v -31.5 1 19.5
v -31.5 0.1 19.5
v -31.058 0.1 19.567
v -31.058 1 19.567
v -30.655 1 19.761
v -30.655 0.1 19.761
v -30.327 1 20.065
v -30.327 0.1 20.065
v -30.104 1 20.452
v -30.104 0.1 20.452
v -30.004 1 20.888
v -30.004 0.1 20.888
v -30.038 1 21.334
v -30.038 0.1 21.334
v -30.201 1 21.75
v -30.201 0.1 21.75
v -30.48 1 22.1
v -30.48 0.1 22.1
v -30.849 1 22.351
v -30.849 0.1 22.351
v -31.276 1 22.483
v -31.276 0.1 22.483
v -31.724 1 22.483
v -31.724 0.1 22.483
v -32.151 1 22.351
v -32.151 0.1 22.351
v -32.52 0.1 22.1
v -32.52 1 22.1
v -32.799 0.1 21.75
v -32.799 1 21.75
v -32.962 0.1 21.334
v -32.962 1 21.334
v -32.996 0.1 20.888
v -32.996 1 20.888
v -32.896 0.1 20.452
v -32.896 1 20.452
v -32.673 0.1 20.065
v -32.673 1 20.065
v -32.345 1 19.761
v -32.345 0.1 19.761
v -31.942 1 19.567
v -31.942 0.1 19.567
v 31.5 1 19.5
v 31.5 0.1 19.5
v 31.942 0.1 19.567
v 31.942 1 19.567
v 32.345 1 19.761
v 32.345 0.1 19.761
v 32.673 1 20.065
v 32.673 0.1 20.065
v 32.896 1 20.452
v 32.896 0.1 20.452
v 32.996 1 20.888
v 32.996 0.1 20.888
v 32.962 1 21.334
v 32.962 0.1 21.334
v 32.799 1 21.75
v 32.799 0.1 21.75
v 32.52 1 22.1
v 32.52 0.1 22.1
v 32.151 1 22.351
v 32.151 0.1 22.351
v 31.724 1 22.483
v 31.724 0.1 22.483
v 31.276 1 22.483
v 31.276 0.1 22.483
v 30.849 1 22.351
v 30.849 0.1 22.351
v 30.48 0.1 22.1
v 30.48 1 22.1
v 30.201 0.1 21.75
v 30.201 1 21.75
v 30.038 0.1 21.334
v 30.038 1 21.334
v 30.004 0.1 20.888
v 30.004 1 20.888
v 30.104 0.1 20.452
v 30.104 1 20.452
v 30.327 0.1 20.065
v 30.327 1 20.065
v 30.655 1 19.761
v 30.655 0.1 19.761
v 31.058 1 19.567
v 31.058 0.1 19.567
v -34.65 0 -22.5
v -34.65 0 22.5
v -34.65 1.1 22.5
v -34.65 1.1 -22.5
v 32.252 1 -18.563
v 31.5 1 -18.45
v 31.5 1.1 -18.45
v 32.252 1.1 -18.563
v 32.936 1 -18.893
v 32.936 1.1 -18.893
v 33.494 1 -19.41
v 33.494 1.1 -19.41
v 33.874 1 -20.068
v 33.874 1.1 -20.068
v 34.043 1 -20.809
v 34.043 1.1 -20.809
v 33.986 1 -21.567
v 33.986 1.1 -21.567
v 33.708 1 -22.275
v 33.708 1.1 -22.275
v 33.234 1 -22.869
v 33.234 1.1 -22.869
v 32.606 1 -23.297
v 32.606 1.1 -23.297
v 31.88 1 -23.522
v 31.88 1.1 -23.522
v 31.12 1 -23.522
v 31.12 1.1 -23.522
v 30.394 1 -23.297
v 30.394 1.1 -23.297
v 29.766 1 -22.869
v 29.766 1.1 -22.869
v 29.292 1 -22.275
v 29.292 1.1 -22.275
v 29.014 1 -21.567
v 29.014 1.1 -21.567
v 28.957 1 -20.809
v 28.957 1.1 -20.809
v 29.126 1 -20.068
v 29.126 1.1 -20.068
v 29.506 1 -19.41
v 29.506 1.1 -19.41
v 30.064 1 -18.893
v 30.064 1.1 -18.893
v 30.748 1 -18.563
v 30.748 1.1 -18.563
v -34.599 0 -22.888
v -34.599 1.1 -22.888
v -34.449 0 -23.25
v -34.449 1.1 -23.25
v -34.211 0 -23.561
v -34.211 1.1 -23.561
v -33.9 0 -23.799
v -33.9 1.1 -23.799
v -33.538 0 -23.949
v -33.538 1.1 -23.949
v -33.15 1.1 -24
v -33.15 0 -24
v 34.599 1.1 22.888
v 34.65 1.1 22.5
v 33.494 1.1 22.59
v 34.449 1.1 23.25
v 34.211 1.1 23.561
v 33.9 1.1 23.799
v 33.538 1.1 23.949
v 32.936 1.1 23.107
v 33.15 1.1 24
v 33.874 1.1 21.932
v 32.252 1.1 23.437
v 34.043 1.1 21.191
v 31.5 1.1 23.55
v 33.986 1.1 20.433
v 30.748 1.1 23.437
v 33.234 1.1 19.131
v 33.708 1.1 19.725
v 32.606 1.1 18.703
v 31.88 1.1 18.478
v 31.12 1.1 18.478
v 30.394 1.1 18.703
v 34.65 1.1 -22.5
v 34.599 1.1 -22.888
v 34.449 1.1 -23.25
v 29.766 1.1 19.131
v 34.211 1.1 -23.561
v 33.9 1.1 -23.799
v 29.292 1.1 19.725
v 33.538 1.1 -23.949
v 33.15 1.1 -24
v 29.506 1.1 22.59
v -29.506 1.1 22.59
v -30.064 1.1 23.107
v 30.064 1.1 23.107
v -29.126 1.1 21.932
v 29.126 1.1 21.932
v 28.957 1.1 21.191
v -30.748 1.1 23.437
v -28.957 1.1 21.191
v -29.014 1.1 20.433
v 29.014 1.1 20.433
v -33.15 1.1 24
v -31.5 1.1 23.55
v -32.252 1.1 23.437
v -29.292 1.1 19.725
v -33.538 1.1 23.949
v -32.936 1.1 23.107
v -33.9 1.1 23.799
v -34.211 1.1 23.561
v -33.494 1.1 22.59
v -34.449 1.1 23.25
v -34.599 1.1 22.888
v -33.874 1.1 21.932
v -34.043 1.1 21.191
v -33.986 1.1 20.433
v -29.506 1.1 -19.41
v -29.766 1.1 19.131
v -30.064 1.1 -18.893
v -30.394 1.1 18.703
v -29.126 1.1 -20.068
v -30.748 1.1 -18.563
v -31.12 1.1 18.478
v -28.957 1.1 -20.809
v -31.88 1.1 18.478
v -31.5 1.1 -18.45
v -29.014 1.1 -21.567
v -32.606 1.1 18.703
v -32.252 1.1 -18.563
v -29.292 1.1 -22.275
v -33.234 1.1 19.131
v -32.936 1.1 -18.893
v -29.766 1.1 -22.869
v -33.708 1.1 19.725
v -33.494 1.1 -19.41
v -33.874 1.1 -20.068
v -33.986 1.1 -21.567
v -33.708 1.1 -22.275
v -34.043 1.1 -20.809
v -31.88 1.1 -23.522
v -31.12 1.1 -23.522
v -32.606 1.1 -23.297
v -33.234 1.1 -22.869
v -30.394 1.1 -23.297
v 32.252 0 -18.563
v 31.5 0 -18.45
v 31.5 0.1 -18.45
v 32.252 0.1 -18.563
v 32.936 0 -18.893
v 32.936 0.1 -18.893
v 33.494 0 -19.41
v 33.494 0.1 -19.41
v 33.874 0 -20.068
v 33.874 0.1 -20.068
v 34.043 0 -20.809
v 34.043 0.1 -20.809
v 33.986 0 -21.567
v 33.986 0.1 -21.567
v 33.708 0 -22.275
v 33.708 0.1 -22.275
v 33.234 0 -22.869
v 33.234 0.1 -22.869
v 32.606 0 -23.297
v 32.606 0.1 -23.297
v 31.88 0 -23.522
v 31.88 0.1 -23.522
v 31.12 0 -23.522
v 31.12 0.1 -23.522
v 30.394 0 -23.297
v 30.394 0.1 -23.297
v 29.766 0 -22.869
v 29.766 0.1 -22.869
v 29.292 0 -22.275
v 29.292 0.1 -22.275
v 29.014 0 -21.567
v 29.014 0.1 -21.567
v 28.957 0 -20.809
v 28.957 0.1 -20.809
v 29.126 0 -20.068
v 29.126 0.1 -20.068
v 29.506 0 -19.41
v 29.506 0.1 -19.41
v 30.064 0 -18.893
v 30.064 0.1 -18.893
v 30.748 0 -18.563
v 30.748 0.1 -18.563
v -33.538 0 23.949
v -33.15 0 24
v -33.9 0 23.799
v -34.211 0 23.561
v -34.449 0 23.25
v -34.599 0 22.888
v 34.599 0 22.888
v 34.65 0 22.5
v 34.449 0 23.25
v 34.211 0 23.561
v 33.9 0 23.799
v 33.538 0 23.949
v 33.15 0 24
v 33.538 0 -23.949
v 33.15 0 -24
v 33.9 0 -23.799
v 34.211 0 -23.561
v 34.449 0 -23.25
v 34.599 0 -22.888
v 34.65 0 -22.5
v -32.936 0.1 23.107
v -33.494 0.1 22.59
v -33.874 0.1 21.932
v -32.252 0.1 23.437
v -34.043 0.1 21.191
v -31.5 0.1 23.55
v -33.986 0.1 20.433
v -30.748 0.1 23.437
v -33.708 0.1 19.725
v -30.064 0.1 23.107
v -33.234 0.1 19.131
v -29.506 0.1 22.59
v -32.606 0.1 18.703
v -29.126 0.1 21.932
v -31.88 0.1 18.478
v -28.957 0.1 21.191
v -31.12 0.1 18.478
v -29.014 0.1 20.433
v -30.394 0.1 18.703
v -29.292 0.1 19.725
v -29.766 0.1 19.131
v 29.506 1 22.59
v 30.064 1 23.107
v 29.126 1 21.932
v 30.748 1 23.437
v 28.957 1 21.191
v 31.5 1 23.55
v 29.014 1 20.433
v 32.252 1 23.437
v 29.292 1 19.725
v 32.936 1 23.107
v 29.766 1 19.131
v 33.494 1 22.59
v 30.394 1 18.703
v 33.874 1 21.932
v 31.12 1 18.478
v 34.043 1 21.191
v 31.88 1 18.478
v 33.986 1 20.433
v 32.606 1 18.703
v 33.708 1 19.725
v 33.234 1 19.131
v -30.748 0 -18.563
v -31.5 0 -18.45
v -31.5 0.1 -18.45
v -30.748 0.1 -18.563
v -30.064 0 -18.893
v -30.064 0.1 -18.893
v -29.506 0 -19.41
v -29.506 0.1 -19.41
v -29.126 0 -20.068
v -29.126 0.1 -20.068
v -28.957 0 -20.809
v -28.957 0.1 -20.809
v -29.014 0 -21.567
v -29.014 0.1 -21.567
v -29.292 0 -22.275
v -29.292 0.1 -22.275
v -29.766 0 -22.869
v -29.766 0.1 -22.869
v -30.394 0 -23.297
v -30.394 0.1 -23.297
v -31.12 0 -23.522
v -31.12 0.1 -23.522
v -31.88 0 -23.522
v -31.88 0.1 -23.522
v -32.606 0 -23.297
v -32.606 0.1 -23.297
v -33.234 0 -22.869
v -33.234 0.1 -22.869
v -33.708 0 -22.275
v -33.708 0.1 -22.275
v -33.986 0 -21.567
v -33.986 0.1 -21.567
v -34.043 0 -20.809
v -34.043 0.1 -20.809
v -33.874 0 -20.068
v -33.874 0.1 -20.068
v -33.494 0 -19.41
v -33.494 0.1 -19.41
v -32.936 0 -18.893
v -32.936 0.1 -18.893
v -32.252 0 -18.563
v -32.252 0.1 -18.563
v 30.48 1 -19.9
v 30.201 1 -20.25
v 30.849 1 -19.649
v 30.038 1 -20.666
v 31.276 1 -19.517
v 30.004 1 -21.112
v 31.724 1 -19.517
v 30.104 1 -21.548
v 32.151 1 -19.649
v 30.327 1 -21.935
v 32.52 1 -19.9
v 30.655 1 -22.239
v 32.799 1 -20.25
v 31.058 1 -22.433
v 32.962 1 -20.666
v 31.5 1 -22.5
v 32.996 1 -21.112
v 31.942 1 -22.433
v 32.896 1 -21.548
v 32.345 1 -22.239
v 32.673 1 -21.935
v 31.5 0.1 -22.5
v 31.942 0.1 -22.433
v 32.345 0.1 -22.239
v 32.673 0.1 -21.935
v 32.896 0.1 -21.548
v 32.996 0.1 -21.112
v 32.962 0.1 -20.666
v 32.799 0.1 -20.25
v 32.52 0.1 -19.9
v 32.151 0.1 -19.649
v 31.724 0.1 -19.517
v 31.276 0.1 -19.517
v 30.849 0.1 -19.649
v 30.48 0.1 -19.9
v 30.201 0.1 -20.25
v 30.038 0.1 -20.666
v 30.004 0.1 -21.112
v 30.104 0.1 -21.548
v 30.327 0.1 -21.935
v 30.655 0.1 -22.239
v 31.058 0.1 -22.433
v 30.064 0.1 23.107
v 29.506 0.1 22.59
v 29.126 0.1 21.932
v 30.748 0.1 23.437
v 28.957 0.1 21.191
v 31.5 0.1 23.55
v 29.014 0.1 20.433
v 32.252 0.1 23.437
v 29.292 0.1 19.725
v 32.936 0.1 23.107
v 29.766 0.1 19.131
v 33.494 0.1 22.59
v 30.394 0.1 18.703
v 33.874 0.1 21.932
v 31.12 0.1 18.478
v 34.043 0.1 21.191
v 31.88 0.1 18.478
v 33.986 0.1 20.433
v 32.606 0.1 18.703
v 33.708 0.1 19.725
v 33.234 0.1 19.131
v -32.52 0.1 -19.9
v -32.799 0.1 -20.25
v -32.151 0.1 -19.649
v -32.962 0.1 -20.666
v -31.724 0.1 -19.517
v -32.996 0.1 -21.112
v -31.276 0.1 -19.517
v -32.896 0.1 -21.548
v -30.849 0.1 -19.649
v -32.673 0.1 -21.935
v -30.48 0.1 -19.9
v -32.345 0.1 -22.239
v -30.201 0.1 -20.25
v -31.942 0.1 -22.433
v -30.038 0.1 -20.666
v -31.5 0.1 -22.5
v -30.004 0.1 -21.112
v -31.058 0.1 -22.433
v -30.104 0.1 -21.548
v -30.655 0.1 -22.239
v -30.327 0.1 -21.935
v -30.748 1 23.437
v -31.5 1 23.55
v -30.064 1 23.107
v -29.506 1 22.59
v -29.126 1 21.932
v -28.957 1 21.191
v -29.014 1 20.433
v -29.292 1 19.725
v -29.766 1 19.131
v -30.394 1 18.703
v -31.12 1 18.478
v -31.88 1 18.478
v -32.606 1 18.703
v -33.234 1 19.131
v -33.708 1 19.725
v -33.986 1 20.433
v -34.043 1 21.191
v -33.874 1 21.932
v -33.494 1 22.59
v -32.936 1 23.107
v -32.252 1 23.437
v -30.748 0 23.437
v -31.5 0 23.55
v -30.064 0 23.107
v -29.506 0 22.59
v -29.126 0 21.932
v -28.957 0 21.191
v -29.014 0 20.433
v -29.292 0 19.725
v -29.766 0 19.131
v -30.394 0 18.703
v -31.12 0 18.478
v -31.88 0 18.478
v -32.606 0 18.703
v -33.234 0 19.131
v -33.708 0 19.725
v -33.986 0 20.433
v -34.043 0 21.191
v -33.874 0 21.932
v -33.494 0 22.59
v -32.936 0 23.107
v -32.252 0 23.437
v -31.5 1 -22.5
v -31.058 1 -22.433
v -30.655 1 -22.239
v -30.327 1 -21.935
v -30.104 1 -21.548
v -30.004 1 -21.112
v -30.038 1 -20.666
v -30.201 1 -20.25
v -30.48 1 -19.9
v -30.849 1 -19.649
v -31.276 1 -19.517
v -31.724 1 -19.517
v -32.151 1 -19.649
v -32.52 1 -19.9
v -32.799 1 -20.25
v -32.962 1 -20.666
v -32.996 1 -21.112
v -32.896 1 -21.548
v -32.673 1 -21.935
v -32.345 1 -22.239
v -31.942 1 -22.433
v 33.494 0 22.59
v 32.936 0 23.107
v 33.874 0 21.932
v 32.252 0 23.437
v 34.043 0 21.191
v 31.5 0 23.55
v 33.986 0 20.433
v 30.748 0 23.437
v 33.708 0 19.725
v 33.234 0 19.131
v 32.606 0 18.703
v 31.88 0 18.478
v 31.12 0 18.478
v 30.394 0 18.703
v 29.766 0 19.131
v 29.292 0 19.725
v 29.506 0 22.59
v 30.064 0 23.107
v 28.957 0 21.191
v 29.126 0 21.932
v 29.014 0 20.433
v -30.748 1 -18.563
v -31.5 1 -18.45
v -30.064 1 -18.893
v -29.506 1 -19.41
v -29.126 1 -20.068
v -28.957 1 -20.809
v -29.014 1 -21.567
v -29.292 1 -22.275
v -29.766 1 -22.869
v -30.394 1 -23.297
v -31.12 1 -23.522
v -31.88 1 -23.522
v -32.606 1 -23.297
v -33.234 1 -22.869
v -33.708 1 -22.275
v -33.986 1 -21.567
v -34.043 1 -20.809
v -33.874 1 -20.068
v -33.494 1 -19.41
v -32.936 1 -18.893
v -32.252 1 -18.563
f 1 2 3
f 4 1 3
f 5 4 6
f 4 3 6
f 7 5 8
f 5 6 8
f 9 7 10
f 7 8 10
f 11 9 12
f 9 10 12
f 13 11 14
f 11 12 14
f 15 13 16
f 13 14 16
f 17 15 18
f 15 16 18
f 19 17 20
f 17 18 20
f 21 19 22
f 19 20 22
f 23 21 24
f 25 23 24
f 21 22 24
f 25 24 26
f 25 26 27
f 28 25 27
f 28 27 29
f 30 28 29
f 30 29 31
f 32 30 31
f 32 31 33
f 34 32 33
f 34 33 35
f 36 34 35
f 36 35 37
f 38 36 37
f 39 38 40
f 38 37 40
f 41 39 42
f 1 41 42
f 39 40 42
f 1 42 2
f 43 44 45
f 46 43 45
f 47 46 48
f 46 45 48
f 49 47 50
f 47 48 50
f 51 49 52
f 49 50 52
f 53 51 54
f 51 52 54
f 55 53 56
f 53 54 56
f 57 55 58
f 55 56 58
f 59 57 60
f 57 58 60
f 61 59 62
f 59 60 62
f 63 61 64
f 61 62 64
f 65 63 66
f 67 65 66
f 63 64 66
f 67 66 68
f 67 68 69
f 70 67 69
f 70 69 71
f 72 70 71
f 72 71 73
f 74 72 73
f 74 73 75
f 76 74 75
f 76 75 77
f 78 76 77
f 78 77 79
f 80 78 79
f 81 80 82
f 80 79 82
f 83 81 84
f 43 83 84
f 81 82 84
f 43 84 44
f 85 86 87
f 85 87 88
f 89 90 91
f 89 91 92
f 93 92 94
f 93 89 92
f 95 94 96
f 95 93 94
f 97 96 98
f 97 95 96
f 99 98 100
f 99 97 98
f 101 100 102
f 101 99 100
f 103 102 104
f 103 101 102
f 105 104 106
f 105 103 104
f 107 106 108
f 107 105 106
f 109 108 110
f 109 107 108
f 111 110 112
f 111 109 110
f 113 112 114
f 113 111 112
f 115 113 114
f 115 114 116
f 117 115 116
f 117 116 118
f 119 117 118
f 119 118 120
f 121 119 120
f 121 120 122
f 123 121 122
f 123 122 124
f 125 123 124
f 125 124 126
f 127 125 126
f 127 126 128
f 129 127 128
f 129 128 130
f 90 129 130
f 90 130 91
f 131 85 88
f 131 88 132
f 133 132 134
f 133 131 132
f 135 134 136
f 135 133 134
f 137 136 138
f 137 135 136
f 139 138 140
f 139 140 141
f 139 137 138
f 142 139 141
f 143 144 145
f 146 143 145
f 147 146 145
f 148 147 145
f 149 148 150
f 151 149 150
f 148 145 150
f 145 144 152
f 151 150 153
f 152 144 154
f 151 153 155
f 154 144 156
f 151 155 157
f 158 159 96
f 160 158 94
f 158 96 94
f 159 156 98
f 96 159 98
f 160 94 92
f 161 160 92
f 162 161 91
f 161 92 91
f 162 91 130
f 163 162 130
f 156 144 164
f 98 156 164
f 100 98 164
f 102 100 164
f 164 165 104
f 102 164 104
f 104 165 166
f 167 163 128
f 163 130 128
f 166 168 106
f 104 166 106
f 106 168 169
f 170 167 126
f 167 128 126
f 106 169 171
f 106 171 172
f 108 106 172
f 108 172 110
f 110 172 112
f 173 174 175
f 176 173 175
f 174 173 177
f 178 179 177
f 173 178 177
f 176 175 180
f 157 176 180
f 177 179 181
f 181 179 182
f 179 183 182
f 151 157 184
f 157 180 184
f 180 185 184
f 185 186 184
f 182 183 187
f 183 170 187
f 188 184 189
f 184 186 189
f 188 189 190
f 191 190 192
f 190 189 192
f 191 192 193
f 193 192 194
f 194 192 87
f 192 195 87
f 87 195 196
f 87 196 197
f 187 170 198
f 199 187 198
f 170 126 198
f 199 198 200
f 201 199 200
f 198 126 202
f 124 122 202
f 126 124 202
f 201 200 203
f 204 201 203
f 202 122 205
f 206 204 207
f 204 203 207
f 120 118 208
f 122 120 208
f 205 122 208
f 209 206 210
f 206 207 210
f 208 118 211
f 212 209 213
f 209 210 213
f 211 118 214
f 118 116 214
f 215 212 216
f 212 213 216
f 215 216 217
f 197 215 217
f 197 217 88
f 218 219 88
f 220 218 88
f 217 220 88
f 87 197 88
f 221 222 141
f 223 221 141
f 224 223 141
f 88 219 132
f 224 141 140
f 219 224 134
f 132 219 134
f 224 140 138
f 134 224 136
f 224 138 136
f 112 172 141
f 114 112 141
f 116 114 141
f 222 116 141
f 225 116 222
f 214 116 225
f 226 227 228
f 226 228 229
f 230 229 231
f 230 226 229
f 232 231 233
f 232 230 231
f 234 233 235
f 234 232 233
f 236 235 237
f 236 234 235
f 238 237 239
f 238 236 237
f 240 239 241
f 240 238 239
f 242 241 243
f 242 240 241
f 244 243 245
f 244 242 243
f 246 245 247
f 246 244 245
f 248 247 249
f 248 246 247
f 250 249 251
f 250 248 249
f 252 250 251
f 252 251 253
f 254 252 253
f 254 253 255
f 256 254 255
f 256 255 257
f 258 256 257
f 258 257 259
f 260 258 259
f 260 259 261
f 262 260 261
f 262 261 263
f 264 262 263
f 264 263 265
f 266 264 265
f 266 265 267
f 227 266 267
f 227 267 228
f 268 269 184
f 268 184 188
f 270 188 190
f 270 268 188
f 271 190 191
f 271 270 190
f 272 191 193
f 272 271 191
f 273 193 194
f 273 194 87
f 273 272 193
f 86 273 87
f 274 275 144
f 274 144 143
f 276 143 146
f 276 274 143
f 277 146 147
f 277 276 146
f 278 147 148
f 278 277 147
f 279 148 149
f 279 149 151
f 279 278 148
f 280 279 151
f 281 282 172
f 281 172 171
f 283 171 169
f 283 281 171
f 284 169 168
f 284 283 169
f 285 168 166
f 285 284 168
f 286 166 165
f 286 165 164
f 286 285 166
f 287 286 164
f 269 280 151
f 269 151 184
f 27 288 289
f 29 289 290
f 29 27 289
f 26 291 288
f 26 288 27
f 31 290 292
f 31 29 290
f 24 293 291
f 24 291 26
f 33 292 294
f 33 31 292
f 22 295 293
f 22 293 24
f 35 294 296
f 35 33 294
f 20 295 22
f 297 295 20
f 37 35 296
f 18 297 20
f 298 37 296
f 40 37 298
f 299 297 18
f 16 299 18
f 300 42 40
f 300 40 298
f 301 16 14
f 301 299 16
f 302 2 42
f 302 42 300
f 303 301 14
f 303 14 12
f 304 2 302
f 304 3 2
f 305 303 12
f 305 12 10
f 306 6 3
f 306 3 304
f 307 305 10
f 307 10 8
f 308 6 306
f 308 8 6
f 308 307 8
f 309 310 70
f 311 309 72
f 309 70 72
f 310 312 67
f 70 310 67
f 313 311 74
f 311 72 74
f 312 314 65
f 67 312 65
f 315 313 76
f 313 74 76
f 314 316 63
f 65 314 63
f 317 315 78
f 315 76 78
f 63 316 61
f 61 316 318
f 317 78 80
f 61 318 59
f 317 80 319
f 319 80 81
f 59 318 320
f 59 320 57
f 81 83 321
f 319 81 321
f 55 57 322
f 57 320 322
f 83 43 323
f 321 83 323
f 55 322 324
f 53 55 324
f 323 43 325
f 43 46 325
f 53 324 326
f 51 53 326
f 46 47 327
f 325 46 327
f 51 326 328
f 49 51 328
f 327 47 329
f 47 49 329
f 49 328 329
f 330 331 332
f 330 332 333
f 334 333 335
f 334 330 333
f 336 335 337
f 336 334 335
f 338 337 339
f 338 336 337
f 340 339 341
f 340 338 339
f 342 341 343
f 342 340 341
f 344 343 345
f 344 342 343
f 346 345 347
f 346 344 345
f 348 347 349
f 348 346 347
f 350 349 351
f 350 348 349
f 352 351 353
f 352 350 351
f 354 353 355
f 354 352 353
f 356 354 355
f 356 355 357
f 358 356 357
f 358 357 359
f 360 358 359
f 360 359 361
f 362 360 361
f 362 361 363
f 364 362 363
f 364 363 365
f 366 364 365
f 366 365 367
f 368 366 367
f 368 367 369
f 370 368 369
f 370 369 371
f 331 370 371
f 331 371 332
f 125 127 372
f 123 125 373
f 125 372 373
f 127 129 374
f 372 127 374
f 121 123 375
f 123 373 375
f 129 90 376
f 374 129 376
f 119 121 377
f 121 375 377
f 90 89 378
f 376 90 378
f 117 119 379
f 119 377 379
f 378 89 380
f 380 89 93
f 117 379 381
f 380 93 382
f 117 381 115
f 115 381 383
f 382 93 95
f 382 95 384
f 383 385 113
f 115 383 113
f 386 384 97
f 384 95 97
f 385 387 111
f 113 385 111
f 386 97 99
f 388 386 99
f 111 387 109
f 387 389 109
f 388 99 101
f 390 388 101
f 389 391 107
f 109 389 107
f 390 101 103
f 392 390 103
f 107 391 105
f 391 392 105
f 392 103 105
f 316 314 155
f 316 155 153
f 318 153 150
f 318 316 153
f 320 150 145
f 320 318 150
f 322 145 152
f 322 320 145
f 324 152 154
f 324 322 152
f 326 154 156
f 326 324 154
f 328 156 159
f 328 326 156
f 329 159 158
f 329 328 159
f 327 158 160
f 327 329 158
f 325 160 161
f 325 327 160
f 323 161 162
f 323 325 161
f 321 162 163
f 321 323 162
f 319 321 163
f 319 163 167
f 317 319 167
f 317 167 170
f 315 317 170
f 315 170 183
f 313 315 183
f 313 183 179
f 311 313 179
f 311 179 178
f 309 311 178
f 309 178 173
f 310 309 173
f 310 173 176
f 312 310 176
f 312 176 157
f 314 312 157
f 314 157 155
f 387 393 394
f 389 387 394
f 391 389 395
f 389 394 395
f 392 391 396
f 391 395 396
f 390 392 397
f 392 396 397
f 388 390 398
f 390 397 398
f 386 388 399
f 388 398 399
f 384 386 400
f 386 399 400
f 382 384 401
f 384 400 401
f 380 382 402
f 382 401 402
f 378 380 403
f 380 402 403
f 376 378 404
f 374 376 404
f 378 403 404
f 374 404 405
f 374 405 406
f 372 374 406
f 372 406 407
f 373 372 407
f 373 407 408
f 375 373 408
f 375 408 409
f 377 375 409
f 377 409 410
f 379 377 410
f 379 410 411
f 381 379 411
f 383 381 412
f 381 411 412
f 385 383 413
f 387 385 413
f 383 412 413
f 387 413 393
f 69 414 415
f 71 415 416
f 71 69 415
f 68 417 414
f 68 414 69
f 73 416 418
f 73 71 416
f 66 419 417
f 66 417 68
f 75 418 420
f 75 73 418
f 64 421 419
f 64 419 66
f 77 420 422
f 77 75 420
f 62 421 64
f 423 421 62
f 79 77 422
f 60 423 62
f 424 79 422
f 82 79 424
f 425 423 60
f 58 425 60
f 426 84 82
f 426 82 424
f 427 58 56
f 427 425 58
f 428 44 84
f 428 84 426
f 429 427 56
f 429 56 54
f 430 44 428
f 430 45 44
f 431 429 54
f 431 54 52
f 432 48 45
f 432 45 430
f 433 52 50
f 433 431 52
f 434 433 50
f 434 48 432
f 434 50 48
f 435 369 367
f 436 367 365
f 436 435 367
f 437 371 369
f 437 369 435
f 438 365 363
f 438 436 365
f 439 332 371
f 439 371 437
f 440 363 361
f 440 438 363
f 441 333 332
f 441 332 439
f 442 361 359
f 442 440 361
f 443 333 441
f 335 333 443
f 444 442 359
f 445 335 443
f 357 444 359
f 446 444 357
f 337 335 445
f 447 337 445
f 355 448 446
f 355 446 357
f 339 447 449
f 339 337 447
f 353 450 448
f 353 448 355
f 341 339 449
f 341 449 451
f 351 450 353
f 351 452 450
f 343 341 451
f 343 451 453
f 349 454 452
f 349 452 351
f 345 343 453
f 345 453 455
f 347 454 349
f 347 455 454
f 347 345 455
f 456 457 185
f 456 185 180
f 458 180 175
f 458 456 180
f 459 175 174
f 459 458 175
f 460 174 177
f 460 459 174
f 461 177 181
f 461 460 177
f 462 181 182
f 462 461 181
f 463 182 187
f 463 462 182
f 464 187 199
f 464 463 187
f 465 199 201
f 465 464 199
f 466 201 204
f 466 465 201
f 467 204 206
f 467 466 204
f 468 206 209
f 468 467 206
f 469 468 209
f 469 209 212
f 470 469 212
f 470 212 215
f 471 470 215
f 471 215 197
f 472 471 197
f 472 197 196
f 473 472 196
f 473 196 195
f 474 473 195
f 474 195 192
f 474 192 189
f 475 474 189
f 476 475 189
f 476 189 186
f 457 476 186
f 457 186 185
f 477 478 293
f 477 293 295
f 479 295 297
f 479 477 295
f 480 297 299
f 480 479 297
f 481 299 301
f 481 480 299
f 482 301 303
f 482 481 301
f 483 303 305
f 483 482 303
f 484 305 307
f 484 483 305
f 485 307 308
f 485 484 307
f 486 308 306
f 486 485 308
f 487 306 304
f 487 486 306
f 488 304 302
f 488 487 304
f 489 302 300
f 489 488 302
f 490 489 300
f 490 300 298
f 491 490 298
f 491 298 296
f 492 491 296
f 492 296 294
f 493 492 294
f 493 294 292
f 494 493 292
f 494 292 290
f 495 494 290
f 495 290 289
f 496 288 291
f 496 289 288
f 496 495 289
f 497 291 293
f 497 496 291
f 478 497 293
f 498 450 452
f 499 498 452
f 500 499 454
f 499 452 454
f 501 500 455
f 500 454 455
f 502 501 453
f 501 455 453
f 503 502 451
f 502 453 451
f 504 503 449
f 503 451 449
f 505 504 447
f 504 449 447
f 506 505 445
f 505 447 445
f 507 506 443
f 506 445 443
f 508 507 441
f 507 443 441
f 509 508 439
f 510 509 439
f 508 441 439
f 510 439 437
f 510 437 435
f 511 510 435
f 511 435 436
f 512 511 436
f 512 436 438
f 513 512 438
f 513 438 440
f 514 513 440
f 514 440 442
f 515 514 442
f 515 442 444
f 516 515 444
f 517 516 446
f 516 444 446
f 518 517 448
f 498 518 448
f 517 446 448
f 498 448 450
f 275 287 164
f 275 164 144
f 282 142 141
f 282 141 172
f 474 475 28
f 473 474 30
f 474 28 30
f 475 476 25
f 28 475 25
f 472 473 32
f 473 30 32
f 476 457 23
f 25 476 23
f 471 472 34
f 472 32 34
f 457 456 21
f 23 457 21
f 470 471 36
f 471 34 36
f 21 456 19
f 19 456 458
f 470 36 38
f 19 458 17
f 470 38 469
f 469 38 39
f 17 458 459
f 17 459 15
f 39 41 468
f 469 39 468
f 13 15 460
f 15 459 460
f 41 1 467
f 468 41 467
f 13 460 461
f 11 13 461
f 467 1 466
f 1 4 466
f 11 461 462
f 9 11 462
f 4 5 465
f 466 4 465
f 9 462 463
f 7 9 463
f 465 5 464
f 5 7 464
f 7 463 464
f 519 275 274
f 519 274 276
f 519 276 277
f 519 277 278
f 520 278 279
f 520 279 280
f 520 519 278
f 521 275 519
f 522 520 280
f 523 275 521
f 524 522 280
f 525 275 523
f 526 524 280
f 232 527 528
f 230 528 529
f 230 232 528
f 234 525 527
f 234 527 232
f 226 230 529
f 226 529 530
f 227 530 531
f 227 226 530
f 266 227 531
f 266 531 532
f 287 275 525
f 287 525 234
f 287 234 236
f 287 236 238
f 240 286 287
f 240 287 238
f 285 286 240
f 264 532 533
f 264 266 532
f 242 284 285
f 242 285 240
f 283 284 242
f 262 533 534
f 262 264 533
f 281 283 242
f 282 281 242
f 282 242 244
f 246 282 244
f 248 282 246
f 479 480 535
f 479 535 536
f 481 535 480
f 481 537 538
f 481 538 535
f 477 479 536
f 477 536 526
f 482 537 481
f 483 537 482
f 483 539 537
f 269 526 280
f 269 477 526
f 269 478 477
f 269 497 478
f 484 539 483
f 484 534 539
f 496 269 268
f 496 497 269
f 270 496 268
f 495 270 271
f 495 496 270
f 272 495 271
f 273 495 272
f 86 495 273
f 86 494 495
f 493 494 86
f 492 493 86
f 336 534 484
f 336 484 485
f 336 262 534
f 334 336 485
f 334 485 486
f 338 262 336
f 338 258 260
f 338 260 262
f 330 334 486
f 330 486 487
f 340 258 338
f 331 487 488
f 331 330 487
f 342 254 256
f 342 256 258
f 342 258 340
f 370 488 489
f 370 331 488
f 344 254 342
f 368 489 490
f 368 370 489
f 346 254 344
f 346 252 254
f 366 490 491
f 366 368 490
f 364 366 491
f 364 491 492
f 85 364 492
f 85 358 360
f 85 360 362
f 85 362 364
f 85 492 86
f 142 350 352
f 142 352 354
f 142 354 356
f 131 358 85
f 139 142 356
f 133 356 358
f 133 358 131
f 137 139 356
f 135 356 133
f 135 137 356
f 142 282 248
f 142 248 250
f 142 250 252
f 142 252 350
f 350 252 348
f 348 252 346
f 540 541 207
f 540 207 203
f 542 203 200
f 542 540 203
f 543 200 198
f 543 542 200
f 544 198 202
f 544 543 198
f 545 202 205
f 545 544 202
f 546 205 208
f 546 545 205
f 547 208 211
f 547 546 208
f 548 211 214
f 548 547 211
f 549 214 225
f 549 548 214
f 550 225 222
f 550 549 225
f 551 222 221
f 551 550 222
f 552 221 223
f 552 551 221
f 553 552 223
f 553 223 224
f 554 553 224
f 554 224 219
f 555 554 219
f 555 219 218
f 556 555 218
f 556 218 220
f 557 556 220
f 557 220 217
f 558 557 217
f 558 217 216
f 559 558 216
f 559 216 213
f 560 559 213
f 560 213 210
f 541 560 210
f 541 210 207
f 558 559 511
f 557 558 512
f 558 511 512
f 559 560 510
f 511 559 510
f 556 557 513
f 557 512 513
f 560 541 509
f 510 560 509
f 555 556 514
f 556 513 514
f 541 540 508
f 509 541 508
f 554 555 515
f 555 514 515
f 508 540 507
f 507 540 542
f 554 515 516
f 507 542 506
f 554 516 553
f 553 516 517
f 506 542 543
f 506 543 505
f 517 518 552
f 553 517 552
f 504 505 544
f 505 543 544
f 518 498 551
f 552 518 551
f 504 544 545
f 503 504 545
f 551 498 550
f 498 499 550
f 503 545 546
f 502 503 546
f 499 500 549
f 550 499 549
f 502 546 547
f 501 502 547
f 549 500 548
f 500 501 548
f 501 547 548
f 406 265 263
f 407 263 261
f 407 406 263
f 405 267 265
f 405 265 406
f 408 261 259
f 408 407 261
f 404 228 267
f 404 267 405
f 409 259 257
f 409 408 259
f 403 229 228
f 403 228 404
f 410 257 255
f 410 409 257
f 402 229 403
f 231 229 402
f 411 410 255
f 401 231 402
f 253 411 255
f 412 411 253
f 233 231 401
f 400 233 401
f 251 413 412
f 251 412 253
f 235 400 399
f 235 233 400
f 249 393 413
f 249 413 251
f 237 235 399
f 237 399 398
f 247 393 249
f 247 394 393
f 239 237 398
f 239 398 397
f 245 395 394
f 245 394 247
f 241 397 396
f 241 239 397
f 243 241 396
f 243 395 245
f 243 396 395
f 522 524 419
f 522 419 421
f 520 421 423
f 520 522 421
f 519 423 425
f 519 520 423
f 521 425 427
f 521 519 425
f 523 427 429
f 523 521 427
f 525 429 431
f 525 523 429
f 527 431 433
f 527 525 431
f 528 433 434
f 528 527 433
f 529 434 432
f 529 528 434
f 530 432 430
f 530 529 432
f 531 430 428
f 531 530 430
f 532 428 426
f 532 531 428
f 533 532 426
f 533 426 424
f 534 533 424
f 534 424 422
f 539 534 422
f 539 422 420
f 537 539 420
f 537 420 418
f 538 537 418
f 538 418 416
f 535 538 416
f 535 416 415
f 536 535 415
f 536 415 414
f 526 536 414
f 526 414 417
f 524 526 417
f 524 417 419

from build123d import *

# Parameters (mm, degrees)
SKETCH_1_R      = 2.55
EXTRUDE_1_DEPTH = 1.1
SKETCH_2_R      = 2.55
SKETCH_2_R_2    = 1.5
EXTRUDE_2_DEPTH = 0.9


with BuildPart() as part:
    # Эскиз1 → Бобышка-Вытянуть1 (new body)
    with BuildSketch(Plane(origin=(0, 0, 0), x_dir=(1, 0, 0), z_dir=(0, 1, 0))):
        with BuildLine():
            Line((33.15, -24), (-33.15, -24))
            ThreePointArc((-33.15, -24), (-34.210660172, -23.560660172), (-34.65, -22.5))
            Line((-34.65, -22.5), (-34.65, 22.5))
            ThreePointArc((-34.65, 22.5), (-34.210660172, 23.560660172), (-33.15, 24))
            Line((-33.15, 24), (33.15, 24))
            ThreePointArc((33.15, 24), (34.210660172, 23.560660172), (34.65, 22.5))
            Line((34.65, 22.5), (34.65, -22.5))
            ThreePointArc((34.65, -22.5), (34.210660172, -23.560660172), (33.15, -24))
        make_face()
        with Locations(Location((-31.5, 21, 0), (0, 0, 270))):
            Circle(SKETCH_1_R, mode=Mode.SUBTRACT)
        with Locations(Location((31.5, 21, 0), (0, 0, 270))):
            Circle(SKETCH_1_R, mode=Mode.SUBTRACT)
        with Locations(Location((31.5, -21, 0), (0, 0, 270))):
            Circle(SKETCH_1_R, mode=Mode.SUBTRACT)
        with Locations(Location((-31.5, -21, 0), (0, 0, 270))):
            Circle(SKETCH_1_R, mode=Mode.SUBTRACT)
    extrude(amount=EXTRUDE_1_DEPTH)

    # Эскиз2 → Бобышка-Вытянуть2 (add)
    # profile 1 of 4: a face of its own
    with BuildSketch(Plane(origin=(0, 0.1, 0), x_dir=(-1, 0, 0), z_dir=(0, -1, 0))):
        with Locations(Location((31.5, -21, 0), (0, 0, 90))):
            Circle(SKETCH_2_R)
        with Locations(Location((31.5, -21, 0), (0, 0, 90))):
            Circle(SKETCH_2_R_2, mode=Mode.SUBTRACT)
    # profile 2 of 4: a face of its own
    with BuildSketch(Plane(origin=(0, 0.1, 0), x_dir=(-1, 0, 0), z_dir=(0, -1, 0))):
        with Locations(Location((-31.5, -21, 0), (0, 0, 90))):
            Circle(SKETCH_2_R)
        with Locations(Location((-31.5, -21, 0), (0, 0, 90))):
            Circle(SKETCH_2_R_2, mode=Mode.SUBTRACT)
    # profile 3 of 4: a face of its own
    with BuildSketch(Plane(origin=(0, 0.1, 0), x_dir=(-1, 0, 0), z_dir=(0, -1, 0))):
        with Locations(Location((-31.5, 21, 0), (0, 0, 90))):
            Circle(SKETCH_2_R)
        with Locations(Location((-31.5, 21, 0), (0, 0, 90))):
            Circle(SKETCH_2_R_2, mode=Mode.SUBTRACT)
    # profile 4 of 4: a face of its own
    with BuildSketch(Plane(origin=(0, 0.1, 0), x_dir=(-1, 0, 0), z_dir=(0, -1, 0))):
        with Locations(Location((31.5, 21, 0), (0, 0, 90))):
            Circle(SKETCH_2_R)
        with Locations(Location((31.5, 21, 0), (0, 0, 90))):
            Circle(SKETCH_2_R_2, mode=Mode.SUBTRACT)
    extrude(amount=-EXTRUDE_2_DEPTH)


solid = part.part
